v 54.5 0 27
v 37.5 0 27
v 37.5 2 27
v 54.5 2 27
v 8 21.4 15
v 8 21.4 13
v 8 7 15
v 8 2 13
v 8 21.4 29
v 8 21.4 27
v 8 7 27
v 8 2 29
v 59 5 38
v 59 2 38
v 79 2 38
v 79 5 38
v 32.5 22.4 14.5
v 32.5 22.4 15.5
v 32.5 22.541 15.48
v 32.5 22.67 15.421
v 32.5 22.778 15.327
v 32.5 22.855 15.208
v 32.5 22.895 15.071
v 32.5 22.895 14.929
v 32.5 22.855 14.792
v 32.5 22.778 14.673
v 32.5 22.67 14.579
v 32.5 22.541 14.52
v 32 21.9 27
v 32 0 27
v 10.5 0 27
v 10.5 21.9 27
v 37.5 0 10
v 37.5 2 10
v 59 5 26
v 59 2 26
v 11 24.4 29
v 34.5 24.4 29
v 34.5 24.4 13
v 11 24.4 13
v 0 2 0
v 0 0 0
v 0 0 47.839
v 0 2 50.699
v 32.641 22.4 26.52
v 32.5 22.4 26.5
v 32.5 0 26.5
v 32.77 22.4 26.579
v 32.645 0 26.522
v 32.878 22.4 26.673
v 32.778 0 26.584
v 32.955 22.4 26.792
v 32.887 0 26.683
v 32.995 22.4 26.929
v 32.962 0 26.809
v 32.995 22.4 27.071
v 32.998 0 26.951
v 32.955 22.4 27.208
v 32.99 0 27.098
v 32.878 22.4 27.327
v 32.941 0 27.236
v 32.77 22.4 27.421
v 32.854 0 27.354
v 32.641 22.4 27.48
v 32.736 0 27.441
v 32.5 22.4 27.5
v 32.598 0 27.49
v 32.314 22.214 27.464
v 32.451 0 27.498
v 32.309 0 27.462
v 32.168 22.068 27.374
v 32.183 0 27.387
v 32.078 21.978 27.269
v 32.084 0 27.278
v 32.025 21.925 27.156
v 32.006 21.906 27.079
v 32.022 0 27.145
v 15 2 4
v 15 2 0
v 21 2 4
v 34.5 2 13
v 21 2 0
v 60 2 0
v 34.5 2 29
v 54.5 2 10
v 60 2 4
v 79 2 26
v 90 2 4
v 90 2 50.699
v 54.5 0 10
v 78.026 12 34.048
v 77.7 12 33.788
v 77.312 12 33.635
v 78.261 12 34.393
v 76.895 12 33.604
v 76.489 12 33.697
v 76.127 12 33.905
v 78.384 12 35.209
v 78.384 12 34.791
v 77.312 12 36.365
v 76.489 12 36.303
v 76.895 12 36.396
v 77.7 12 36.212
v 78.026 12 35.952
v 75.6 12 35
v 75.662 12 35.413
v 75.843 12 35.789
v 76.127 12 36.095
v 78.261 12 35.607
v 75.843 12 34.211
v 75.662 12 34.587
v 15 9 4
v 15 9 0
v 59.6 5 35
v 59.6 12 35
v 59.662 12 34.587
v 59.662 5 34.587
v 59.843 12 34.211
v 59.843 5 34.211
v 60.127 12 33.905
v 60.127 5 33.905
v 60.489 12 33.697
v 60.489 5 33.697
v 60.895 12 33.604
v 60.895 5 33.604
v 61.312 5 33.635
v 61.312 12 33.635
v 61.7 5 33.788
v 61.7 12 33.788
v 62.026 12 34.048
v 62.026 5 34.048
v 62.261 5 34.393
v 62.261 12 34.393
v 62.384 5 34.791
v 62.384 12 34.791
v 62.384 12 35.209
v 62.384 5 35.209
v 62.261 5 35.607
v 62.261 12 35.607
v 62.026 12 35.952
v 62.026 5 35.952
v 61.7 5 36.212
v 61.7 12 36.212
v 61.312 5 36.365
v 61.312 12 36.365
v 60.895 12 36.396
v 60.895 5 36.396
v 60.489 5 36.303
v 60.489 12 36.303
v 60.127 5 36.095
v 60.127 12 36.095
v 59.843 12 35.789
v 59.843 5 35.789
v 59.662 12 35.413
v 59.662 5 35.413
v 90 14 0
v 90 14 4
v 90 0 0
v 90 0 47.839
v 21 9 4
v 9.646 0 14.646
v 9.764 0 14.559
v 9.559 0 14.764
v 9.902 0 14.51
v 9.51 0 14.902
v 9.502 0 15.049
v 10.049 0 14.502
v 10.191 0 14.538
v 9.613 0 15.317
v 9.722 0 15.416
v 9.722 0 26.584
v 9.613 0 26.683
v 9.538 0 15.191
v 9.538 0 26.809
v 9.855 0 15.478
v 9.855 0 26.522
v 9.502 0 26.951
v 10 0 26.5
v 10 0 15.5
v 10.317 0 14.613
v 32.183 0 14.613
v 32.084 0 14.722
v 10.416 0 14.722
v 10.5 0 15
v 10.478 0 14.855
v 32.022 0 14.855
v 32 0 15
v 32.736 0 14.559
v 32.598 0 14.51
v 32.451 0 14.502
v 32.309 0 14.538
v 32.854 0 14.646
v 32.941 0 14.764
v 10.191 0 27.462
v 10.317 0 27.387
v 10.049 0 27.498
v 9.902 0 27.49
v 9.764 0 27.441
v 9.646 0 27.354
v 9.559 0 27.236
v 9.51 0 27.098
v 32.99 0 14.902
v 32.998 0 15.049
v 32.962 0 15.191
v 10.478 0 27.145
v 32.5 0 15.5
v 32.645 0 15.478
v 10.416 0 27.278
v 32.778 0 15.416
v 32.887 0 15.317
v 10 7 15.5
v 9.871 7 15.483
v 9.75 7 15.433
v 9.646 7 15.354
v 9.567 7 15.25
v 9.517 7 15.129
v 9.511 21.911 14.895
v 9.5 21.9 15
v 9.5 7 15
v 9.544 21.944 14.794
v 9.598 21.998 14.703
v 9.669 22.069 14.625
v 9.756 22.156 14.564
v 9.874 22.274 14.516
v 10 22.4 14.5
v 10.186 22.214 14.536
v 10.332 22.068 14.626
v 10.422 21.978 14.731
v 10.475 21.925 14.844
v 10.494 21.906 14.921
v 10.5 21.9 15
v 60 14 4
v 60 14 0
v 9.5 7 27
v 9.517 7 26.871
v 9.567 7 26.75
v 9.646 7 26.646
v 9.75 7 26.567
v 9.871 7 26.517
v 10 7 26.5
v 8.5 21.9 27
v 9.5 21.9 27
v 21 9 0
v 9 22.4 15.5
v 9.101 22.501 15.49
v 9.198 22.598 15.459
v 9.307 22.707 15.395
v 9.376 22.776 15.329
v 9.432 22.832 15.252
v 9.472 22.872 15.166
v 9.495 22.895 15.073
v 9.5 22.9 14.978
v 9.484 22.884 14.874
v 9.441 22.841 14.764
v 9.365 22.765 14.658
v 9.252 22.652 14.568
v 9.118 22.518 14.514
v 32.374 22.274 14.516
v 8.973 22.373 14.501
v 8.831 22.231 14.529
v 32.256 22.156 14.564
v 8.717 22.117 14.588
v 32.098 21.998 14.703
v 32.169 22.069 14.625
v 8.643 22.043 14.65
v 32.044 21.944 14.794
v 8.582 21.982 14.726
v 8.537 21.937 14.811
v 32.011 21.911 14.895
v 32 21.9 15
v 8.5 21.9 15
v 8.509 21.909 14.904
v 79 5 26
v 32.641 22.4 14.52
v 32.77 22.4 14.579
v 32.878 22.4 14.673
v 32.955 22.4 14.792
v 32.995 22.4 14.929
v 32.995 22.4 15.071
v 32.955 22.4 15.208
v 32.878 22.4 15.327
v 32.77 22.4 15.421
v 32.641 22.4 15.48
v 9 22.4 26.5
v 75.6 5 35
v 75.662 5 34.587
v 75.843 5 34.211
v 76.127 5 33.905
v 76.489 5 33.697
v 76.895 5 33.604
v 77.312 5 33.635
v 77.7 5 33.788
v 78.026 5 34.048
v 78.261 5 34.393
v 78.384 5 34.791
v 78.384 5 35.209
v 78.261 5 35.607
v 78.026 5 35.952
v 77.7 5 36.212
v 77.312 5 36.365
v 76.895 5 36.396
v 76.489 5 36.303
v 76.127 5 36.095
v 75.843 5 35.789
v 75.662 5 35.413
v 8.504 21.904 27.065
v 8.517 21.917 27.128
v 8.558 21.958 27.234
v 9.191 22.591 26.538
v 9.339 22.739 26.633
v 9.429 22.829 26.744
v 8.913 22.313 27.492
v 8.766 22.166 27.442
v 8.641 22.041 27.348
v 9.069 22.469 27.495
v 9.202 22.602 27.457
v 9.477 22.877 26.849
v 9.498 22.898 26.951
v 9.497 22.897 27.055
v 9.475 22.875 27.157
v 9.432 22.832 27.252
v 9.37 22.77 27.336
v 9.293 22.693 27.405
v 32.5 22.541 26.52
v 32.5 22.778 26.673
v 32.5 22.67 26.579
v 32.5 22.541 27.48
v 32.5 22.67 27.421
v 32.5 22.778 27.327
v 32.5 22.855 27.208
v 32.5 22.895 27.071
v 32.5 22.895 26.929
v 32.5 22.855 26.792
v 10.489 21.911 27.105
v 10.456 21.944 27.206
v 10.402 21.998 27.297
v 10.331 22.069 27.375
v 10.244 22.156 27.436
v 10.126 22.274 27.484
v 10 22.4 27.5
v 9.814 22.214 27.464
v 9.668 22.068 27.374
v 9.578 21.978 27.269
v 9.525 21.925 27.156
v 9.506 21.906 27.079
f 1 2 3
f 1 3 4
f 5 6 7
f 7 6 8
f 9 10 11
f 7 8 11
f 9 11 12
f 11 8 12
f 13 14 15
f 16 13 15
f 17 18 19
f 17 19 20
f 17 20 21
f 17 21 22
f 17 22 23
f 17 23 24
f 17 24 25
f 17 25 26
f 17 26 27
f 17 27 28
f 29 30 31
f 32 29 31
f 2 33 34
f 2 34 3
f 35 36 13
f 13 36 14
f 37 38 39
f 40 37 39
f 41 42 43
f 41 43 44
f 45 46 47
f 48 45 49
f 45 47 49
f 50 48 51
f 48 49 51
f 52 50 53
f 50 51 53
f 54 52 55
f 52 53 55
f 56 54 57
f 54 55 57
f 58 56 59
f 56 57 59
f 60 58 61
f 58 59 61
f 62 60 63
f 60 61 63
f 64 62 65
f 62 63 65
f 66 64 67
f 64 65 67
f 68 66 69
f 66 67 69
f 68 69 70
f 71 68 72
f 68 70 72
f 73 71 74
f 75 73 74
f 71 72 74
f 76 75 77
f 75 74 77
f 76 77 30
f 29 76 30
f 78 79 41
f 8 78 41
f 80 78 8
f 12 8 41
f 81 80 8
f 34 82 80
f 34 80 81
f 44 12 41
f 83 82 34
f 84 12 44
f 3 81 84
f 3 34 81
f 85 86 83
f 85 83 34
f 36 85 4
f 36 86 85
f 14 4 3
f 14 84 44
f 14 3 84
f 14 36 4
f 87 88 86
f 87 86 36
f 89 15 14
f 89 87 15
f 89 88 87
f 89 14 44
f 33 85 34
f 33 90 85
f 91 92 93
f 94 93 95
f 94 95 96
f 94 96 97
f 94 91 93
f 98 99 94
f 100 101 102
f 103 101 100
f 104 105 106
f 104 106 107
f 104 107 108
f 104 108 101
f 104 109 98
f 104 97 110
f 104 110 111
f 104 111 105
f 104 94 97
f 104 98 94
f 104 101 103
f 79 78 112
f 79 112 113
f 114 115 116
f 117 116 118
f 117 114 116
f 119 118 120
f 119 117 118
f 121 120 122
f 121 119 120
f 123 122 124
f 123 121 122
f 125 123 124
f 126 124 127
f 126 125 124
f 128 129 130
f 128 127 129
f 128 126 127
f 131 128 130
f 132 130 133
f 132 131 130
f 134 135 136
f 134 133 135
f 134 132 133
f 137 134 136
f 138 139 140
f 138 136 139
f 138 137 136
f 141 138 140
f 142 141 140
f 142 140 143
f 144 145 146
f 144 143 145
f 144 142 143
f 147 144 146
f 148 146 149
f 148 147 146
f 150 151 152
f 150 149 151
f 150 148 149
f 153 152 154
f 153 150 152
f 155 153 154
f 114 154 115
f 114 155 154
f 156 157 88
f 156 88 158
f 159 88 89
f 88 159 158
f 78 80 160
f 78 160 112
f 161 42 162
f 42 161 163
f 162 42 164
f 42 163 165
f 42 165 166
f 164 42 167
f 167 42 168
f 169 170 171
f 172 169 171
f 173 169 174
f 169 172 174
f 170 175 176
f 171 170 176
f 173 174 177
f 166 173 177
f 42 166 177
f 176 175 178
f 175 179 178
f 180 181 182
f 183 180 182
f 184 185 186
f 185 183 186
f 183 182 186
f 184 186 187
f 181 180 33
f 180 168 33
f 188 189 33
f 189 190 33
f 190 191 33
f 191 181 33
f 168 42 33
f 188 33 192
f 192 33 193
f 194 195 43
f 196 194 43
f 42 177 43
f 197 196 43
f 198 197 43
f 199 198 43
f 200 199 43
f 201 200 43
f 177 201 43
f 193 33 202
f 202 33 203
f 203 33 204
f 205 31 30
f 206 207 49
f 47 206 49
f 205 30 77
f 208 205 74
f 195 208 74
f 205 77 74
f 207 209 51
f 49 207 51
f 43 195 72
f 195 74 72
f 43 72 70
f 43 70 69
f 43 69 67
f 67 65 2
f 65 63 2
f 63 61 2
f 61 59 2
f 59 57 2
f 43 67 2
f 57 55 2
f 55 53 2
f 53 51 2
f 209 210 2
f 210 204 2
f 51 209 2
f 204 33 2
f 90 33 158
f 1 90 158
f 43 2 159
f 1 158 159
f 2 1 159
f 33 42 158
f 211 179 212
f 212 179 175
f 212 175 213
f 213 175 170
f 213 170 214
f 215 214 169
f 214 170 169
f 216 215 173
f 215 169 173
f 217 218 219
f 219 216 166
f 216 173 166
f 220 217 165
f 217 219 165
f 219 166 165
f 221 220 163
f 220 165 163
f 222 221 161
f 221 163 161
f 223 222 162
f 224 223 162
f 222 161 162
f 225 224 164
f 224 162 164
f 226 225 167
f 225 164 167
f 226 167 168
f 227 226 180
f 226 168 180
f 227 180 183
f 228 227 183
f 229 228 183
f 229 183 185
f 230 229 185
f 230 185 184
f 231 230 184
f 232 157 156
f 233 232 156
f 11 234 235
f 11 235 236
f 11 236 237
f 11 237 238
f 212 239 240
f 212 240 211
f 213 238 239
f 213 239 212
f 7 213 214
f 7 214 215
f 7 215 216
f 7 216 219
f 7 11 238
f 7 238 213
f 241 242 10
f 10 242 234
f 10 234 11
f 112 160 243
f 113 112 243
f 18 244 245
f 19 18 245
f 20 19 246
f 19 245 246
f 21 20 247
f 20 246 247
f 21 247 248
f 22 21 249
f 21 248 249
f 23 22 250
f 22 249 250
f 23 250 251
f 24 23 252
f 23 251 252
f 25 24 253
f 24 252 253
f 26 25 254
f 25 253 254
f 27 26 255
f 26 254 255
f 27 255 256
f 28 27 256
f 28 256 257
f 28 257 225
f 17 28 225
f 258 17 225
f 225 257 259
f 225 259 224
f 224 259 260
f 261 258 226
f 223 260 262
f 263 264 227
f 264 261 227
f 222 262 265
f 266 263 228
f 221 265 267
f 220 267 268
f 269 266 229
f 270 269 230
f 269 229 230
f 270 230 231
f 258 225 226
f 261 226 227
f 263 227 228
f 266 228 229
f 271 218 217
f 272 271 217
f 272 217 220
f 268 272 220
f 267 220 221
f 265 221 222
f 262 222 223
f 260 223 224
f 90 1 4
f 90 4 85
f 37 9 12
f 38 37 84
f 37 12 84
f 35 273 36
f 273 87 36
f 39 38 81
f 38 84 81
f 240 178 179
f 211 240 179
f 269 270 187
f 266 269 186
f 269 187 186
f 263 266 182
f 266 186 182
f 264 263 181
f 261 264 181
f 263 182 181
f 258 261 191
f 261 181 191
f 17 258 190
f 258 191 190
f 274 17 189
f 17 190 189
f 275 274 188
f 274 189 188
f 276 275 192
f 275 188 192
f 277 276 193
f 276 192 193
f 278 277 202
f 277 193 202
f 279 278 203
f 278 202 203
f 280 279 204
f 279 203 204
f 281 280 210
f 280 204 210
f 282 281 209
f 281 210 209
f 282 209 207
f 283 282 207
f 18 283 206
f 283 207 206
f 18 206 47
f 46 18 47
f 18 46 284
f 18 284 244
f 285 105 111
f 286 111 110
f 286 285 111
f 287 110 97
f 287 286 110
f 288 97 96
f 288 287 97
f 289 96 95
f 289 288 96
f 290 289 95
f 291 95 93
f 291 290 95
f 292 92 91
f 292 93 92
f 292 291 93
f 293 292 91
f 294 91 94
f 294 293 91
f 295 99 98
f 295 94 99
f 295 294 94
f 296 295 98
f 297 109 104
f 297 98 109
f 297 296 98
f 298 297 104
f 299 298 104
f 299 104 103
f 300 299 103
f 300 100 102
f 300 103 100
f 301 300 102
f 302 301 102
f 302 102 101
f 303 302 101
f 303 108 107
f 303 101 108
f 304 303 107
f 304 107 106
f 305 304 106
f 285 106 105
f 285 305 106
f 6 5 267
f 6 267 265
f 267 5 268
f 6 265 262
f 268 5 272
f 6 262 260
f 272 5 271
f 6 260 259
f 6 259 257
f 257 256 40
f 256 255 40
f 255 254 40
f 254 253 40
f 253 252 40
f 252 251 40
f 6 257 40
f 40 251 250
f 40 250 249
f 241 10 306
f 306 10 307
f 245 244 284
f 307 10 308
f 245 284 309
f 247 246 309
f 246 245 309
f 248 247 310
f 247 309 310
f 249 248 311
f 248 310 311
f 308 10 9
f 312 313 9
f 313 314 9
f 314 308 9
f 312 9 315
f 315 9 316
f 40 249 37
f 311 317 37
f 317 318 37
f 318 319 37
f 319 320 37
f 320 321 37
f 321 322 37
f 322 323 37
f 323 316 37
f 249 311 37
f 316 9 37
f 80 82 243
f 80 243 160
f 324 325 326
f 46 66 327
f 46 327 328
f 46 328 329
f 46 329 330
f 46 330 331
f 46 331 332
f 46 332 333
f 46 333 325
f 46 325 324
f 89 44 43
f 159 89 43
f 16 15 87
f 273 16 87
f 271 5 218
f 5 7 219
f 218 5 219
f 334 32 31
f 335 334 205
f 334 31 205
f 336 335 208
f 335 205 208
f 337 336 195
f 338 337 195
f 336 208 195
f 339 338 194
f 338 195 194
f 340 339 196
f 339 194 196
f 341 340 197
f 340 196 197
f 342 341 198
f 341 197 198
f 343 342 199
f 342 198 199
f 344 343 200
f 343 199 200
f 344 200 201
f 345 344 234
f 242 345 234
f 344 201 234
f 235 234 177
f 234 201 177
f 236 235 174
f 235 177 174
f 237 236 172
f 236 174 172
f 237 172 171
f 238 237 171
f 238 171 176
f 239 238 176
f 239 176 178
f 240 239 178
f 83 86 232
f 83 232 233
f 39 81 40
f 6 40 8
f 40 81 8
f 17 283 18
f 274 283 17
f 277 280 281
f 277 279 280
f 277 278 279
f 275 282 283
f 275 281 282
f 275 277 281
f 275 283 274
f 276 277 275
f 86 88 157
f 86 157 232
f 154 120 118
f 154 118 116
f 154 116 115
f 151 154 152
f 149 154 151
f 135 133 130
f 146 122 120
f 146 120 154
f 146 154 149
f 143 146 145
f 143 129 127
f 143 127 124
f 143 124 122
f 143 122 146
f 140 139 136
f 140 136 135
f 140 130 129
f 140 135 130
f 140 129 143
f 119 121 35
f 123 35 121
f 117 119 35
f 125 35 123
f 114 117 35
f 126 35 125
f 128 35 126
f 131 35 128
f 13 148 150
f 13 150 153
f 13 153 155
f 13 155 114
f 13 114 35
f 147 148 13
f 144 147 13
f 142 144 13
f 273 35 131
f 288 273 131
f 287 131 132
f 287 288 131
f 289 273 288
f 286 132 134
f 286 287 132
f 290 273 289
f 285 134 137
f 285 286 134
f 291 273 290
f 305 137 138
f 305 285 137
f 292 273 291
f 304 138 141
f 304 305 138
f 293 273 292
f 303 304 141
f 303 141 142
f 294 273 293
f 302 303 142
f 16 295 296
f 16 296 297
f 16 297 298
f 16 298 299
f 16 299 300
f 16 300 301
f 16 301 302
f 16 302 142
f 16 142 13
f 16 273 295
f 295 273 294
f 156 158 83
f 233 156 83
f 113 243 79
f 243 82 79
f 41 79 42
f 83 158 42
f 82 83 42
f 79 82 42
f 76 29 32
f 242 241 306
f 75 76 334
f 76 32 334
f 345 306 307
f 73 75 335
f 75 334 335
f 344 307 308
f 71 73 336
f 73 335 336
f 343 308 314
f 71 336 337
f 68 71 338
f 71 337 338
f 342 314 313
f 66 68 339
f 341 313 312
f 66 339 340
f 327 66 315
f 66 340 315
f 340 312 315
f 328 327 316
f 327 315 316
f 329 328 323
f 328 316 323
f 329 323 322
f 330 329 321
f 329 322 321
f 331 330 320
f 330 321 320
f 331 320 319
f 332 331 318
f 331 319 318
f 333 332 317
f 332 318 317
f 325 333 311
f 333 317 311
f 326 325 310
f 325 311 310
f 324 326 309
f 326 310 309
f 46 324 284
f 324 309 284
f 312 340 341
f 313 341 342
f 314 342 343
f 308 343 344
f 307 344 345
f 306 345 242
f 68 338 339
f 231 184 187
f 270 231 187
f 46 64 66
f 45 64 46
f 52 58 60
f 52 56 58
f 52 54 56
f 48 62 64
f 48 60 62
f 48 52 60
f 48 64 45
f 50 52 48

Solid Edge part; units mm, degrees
sketch "Sketch1" plane through (0, 0, 0) normal (0, -1, 0) x (1, 0, 0)
  line L0 (0, 50.6986) -> (13.1232, 65)
  line L1 (13.1232, 65) -> (90, 65)
  line L2 (90, 65) -> (90, 0)
  line L3 (90, 0) -> (0, 0)
  line L4 (0, 0) -> (0, 50.6986)
  dimension "D1" = 65
  dimension "D2" = 90
  dimension "D3" = 14.3014
  dimension "D4" = 13.1232
extrude "Protrusion1" add sketch "Sketch1" against normal blind 2
sketch "Sketch2" plane through (45, 0, 32.5) normal (0, -1, 0) x (1, 0, 0)
  line L0 (-35, -17.5) -> (-12.5, -17.5)
  line L1 (-12.5, -17.5) -> (-12.5, -5.5)
  line L2 (-12.5, -5.5) -> (-35, -5.5)
  line L3 (-35, -5.5) -> (-35, -17.5)
  dimension "D1" = 10
  dimension "D2" = 12
  dimension "D3" = 22.5
  dimension "D4" = 38
extrude "Cutout1" cut sketch "Sketch2" against normal through all
sketch "Sketch3" plane through (45, 2, 32.5) normal (0, 1, 0) x (-1, 0, 0)
  line L0 (12.5, -5.5) -> (35, -5.5)
  line L1 (35, -5.5) -> (35, -17.5)
  line L2 (35, -17.5) -> (12.5, -17.5)
  line L3 (12.5, -17.5) -> (12.5, -5.5)
  line L4 (10.5, -19.5) -> (37, -19.5)
  line L5 (37, -19.5) -> (37, -3.5)
  line L6 (37, -3.5) -> (10.5, -3.5)
  line L7 (10.5, -3.5) -> (10.5, -19.5)
  dimension "D1" = 2
  dimension "D2" = 2
extrude "Extrusionsausprägung_2" add sketch "Sketch3" along normal blind 20.4
sketch "Sketch4" plane through (24.25, 22.4, 21) normal (0, 1, 0) x (-1, 0, 0)
  line L0 (-10.25, 8) -> (16.25, 8)
  line L1 (16.25, 8) -> (16.25, -8)
  line L2 (16.25, -8) -> (-10.25, -8)
  line L3 (-10.25, -8) -> (-10.25, 8)
extrude "Extrusionsausprägung_3" add sketch "Sketch4" along normal blind 2
sketch "Sketch5" plane through (8, 13.2, 21) normal (-1, 0, 0) x (0, -1, 0)
  line L0 (-9.2, 6) -> (6.2, 6)
  line L1 (6.2, 6) -> (6.2, -6)
  line L2 (6.2, -6) -> (-9.2, -6)
  line L3 (-9.2, -6) -> (-9.2, 6)
  dimension "D1" = 5
extrude "Cutout2" cut sketch "Sketch5" against normal up to next
sketch "Sketch6" plane through (45, 0, 32.5) normal (0, -1, 0) x (1, 0, 0)
  arc A0 (-34.5, -5.5) -> (-35, -6) centre (-35, -5.5) ccw
  line L0 (-35, -5.5) -> (-35, -6)
  line L1 (-34.5, -5.5) -> (-35, -5.5)
  arc A1 (-13, -5.5) -> (-12.5, -6) centre (-12.5, -5.5) cw
  line L2 (-12.5, -5.5) -> (-12.5, -6)
  line L3 (-13, -5.5) -> (-12.5, -5.5)
  arc A2 (-12.5, -17) -> (-13, -17.5) centre (-12.5, -17.5) cw
  line L4 (-12.5, -17.5) -> (-13, -17.5)
  line L5 (-12.5, -17) -> (-12.5, -17.5)
  arc A3 (-34.5, -17.5) -> (-35, -17) centre (-35, -17.5) cw
  line L6 (-35, -17) -> (-35, -17.5)
  line L7 (-35, -17.5) -> (-34.5, -17.5)
  dimension "D1" = 0.5
extrude "Cutout3" cut sketch "Sketch6" against normal up to vertex (22.4 mm away)
sketch "Sketch7" plane through (8, 13.2, 21) normal (-1, 0, 0) x (0, -1, 0)
  arc A0 (-8.7, 6) -> (-9.2, 5.5) centre (-9.2, 6) ccw
  line L0 (-9.2, 6) -> (-9.2, 5.5)
  line L1 (-8.7, 6) -> (-9.2, 6)
  arc A1 (-9.2, -5.5) -> (-8.7, -6) centre (-9.2, -6) ccw
  line L2 (-9.2, -6) -> (-8.7, -6)
  line L3 (-9.2, -5.5) -> (-9.2, -6)
  dimension "D1" = 0.5
extrude "Cutout4" cut sketch "Sketch7" against normal up to vertex (24.5 mm away)
sketch "Sketch8" plane through (45, 2, 32.5) normal (0, 1, 0) x (-1, 0, 0)
  circle A0 centre (-32, 2.5) radius 1.4
  circle A1 centre (-16, 2.5) radius 1.4
  dimension "D1" = 16
  dimension "D2" = 2.8
  dimension "D3" = 30
  dimension "D4" = 13
extrude "Gy_521" add sketch "Sketch8" along normal blind 10
sketch "Sketch9" plane through (45, 2, 32.5) normal (0, 1, 0) x (-1, 0, 0)
  line L0 (-34, -6.5) -> (-14, -6.5)
  line L1 (-14, -6.5) -> (-14, 5.5)
  line L2 (-14, 5.5) -> (-34, 5.5)
  line L3 (-34, 5.5) -> (-34, -6.5)
  dimension "D1" = 12
  dimension "D2" = 20
  dimension "D3" = 3
extrude "Extrusionsausprägung_5" add sketch "Sketch9" along normal blind 3
chamfer "Fase_1" distance 3 angle 45 1 edges at (8, 24.4, 21)
sketch "Sketch10" plane through (45, 0, 32.5) normal (0, -1, 0) x (1, 0, 0)
  line L0 (-7.5, -5.5) -> (9.5, -5.5)
  line L1 (9.5, -5.5) -> (9.5, -22.5)
  line L2 (9.5, -22.5) -> (-7.5, -22.5)
  line L3 (-7.5, -22.5) -> (-7.5, -5.5)
  dimension "D1" = 5
  dimension "D2" = 17
  dimension "D3" = 17
extrude "Cutout5" cut sketch "Sketch10" against normal up to next
sketch "Sketch11" plane through (45, 0, 32.5) normal (0, -1, 0) x (1, 0, 0)
  line L0 (-45, 18.1986) -> (45, 18.1986)
extrude "Cutout6" cut sketch "Sketch11" against normal through all material side at (45, 0, 50.7486)
sketch "Sketch12" plane through (0, 1, 25.3493) normal (-1, 0, 0) x (0, 0, -1)
  line L0 (-25.3493, -1) -> (-22.4898, 1)
  line L1 (-22.4898, 1) -> (-25.3493, 1)
  line L2 (-25.3493, 1) -> (-25.3493, -1)
extrude "Cutout7" cut sketch "Sketch12" against normal through all
sketch "Sketch13" plane through (45, 2, 25.3493) normal (0, 1, 0) x (-1, 0, 0)
  line L0 (-45, -21.3493) -> (-15, -21.3493)
  line L1 (-15, -21.3493) -> (-15, -25.3493)
  line L2 (-15, -25.3493) -> (-45, -25.3493)
  line L3 (-45, -25.3493) -> (-45, -21.3493)
  dimension "D1" = 30
  dimension "D2" = 4
extrude "Extrusionsausprägung_6" add sketch "Sketch13" along normal blind 12
sketch "Sketch14" plane through (45, 2, 25.3493) normal (0, 1, 0) x (-1, 0, 0)
  line L0 (30, -25.3493) -> (24, -25.3493)
  line L1 (24, -25.3493) -> (24, -21.3493)
  line L2 (24, -21.3493) -> (30, -21.3493)
  line L3 (30, -21.3493) -> (30, -25.3493)
  dimension "D1" = 4
  dimension "D2" = 6
  dimension "D3" = 15
extrude "Extrusionsausprägung_7" add sketch "Sketch14" along normal blind 7
